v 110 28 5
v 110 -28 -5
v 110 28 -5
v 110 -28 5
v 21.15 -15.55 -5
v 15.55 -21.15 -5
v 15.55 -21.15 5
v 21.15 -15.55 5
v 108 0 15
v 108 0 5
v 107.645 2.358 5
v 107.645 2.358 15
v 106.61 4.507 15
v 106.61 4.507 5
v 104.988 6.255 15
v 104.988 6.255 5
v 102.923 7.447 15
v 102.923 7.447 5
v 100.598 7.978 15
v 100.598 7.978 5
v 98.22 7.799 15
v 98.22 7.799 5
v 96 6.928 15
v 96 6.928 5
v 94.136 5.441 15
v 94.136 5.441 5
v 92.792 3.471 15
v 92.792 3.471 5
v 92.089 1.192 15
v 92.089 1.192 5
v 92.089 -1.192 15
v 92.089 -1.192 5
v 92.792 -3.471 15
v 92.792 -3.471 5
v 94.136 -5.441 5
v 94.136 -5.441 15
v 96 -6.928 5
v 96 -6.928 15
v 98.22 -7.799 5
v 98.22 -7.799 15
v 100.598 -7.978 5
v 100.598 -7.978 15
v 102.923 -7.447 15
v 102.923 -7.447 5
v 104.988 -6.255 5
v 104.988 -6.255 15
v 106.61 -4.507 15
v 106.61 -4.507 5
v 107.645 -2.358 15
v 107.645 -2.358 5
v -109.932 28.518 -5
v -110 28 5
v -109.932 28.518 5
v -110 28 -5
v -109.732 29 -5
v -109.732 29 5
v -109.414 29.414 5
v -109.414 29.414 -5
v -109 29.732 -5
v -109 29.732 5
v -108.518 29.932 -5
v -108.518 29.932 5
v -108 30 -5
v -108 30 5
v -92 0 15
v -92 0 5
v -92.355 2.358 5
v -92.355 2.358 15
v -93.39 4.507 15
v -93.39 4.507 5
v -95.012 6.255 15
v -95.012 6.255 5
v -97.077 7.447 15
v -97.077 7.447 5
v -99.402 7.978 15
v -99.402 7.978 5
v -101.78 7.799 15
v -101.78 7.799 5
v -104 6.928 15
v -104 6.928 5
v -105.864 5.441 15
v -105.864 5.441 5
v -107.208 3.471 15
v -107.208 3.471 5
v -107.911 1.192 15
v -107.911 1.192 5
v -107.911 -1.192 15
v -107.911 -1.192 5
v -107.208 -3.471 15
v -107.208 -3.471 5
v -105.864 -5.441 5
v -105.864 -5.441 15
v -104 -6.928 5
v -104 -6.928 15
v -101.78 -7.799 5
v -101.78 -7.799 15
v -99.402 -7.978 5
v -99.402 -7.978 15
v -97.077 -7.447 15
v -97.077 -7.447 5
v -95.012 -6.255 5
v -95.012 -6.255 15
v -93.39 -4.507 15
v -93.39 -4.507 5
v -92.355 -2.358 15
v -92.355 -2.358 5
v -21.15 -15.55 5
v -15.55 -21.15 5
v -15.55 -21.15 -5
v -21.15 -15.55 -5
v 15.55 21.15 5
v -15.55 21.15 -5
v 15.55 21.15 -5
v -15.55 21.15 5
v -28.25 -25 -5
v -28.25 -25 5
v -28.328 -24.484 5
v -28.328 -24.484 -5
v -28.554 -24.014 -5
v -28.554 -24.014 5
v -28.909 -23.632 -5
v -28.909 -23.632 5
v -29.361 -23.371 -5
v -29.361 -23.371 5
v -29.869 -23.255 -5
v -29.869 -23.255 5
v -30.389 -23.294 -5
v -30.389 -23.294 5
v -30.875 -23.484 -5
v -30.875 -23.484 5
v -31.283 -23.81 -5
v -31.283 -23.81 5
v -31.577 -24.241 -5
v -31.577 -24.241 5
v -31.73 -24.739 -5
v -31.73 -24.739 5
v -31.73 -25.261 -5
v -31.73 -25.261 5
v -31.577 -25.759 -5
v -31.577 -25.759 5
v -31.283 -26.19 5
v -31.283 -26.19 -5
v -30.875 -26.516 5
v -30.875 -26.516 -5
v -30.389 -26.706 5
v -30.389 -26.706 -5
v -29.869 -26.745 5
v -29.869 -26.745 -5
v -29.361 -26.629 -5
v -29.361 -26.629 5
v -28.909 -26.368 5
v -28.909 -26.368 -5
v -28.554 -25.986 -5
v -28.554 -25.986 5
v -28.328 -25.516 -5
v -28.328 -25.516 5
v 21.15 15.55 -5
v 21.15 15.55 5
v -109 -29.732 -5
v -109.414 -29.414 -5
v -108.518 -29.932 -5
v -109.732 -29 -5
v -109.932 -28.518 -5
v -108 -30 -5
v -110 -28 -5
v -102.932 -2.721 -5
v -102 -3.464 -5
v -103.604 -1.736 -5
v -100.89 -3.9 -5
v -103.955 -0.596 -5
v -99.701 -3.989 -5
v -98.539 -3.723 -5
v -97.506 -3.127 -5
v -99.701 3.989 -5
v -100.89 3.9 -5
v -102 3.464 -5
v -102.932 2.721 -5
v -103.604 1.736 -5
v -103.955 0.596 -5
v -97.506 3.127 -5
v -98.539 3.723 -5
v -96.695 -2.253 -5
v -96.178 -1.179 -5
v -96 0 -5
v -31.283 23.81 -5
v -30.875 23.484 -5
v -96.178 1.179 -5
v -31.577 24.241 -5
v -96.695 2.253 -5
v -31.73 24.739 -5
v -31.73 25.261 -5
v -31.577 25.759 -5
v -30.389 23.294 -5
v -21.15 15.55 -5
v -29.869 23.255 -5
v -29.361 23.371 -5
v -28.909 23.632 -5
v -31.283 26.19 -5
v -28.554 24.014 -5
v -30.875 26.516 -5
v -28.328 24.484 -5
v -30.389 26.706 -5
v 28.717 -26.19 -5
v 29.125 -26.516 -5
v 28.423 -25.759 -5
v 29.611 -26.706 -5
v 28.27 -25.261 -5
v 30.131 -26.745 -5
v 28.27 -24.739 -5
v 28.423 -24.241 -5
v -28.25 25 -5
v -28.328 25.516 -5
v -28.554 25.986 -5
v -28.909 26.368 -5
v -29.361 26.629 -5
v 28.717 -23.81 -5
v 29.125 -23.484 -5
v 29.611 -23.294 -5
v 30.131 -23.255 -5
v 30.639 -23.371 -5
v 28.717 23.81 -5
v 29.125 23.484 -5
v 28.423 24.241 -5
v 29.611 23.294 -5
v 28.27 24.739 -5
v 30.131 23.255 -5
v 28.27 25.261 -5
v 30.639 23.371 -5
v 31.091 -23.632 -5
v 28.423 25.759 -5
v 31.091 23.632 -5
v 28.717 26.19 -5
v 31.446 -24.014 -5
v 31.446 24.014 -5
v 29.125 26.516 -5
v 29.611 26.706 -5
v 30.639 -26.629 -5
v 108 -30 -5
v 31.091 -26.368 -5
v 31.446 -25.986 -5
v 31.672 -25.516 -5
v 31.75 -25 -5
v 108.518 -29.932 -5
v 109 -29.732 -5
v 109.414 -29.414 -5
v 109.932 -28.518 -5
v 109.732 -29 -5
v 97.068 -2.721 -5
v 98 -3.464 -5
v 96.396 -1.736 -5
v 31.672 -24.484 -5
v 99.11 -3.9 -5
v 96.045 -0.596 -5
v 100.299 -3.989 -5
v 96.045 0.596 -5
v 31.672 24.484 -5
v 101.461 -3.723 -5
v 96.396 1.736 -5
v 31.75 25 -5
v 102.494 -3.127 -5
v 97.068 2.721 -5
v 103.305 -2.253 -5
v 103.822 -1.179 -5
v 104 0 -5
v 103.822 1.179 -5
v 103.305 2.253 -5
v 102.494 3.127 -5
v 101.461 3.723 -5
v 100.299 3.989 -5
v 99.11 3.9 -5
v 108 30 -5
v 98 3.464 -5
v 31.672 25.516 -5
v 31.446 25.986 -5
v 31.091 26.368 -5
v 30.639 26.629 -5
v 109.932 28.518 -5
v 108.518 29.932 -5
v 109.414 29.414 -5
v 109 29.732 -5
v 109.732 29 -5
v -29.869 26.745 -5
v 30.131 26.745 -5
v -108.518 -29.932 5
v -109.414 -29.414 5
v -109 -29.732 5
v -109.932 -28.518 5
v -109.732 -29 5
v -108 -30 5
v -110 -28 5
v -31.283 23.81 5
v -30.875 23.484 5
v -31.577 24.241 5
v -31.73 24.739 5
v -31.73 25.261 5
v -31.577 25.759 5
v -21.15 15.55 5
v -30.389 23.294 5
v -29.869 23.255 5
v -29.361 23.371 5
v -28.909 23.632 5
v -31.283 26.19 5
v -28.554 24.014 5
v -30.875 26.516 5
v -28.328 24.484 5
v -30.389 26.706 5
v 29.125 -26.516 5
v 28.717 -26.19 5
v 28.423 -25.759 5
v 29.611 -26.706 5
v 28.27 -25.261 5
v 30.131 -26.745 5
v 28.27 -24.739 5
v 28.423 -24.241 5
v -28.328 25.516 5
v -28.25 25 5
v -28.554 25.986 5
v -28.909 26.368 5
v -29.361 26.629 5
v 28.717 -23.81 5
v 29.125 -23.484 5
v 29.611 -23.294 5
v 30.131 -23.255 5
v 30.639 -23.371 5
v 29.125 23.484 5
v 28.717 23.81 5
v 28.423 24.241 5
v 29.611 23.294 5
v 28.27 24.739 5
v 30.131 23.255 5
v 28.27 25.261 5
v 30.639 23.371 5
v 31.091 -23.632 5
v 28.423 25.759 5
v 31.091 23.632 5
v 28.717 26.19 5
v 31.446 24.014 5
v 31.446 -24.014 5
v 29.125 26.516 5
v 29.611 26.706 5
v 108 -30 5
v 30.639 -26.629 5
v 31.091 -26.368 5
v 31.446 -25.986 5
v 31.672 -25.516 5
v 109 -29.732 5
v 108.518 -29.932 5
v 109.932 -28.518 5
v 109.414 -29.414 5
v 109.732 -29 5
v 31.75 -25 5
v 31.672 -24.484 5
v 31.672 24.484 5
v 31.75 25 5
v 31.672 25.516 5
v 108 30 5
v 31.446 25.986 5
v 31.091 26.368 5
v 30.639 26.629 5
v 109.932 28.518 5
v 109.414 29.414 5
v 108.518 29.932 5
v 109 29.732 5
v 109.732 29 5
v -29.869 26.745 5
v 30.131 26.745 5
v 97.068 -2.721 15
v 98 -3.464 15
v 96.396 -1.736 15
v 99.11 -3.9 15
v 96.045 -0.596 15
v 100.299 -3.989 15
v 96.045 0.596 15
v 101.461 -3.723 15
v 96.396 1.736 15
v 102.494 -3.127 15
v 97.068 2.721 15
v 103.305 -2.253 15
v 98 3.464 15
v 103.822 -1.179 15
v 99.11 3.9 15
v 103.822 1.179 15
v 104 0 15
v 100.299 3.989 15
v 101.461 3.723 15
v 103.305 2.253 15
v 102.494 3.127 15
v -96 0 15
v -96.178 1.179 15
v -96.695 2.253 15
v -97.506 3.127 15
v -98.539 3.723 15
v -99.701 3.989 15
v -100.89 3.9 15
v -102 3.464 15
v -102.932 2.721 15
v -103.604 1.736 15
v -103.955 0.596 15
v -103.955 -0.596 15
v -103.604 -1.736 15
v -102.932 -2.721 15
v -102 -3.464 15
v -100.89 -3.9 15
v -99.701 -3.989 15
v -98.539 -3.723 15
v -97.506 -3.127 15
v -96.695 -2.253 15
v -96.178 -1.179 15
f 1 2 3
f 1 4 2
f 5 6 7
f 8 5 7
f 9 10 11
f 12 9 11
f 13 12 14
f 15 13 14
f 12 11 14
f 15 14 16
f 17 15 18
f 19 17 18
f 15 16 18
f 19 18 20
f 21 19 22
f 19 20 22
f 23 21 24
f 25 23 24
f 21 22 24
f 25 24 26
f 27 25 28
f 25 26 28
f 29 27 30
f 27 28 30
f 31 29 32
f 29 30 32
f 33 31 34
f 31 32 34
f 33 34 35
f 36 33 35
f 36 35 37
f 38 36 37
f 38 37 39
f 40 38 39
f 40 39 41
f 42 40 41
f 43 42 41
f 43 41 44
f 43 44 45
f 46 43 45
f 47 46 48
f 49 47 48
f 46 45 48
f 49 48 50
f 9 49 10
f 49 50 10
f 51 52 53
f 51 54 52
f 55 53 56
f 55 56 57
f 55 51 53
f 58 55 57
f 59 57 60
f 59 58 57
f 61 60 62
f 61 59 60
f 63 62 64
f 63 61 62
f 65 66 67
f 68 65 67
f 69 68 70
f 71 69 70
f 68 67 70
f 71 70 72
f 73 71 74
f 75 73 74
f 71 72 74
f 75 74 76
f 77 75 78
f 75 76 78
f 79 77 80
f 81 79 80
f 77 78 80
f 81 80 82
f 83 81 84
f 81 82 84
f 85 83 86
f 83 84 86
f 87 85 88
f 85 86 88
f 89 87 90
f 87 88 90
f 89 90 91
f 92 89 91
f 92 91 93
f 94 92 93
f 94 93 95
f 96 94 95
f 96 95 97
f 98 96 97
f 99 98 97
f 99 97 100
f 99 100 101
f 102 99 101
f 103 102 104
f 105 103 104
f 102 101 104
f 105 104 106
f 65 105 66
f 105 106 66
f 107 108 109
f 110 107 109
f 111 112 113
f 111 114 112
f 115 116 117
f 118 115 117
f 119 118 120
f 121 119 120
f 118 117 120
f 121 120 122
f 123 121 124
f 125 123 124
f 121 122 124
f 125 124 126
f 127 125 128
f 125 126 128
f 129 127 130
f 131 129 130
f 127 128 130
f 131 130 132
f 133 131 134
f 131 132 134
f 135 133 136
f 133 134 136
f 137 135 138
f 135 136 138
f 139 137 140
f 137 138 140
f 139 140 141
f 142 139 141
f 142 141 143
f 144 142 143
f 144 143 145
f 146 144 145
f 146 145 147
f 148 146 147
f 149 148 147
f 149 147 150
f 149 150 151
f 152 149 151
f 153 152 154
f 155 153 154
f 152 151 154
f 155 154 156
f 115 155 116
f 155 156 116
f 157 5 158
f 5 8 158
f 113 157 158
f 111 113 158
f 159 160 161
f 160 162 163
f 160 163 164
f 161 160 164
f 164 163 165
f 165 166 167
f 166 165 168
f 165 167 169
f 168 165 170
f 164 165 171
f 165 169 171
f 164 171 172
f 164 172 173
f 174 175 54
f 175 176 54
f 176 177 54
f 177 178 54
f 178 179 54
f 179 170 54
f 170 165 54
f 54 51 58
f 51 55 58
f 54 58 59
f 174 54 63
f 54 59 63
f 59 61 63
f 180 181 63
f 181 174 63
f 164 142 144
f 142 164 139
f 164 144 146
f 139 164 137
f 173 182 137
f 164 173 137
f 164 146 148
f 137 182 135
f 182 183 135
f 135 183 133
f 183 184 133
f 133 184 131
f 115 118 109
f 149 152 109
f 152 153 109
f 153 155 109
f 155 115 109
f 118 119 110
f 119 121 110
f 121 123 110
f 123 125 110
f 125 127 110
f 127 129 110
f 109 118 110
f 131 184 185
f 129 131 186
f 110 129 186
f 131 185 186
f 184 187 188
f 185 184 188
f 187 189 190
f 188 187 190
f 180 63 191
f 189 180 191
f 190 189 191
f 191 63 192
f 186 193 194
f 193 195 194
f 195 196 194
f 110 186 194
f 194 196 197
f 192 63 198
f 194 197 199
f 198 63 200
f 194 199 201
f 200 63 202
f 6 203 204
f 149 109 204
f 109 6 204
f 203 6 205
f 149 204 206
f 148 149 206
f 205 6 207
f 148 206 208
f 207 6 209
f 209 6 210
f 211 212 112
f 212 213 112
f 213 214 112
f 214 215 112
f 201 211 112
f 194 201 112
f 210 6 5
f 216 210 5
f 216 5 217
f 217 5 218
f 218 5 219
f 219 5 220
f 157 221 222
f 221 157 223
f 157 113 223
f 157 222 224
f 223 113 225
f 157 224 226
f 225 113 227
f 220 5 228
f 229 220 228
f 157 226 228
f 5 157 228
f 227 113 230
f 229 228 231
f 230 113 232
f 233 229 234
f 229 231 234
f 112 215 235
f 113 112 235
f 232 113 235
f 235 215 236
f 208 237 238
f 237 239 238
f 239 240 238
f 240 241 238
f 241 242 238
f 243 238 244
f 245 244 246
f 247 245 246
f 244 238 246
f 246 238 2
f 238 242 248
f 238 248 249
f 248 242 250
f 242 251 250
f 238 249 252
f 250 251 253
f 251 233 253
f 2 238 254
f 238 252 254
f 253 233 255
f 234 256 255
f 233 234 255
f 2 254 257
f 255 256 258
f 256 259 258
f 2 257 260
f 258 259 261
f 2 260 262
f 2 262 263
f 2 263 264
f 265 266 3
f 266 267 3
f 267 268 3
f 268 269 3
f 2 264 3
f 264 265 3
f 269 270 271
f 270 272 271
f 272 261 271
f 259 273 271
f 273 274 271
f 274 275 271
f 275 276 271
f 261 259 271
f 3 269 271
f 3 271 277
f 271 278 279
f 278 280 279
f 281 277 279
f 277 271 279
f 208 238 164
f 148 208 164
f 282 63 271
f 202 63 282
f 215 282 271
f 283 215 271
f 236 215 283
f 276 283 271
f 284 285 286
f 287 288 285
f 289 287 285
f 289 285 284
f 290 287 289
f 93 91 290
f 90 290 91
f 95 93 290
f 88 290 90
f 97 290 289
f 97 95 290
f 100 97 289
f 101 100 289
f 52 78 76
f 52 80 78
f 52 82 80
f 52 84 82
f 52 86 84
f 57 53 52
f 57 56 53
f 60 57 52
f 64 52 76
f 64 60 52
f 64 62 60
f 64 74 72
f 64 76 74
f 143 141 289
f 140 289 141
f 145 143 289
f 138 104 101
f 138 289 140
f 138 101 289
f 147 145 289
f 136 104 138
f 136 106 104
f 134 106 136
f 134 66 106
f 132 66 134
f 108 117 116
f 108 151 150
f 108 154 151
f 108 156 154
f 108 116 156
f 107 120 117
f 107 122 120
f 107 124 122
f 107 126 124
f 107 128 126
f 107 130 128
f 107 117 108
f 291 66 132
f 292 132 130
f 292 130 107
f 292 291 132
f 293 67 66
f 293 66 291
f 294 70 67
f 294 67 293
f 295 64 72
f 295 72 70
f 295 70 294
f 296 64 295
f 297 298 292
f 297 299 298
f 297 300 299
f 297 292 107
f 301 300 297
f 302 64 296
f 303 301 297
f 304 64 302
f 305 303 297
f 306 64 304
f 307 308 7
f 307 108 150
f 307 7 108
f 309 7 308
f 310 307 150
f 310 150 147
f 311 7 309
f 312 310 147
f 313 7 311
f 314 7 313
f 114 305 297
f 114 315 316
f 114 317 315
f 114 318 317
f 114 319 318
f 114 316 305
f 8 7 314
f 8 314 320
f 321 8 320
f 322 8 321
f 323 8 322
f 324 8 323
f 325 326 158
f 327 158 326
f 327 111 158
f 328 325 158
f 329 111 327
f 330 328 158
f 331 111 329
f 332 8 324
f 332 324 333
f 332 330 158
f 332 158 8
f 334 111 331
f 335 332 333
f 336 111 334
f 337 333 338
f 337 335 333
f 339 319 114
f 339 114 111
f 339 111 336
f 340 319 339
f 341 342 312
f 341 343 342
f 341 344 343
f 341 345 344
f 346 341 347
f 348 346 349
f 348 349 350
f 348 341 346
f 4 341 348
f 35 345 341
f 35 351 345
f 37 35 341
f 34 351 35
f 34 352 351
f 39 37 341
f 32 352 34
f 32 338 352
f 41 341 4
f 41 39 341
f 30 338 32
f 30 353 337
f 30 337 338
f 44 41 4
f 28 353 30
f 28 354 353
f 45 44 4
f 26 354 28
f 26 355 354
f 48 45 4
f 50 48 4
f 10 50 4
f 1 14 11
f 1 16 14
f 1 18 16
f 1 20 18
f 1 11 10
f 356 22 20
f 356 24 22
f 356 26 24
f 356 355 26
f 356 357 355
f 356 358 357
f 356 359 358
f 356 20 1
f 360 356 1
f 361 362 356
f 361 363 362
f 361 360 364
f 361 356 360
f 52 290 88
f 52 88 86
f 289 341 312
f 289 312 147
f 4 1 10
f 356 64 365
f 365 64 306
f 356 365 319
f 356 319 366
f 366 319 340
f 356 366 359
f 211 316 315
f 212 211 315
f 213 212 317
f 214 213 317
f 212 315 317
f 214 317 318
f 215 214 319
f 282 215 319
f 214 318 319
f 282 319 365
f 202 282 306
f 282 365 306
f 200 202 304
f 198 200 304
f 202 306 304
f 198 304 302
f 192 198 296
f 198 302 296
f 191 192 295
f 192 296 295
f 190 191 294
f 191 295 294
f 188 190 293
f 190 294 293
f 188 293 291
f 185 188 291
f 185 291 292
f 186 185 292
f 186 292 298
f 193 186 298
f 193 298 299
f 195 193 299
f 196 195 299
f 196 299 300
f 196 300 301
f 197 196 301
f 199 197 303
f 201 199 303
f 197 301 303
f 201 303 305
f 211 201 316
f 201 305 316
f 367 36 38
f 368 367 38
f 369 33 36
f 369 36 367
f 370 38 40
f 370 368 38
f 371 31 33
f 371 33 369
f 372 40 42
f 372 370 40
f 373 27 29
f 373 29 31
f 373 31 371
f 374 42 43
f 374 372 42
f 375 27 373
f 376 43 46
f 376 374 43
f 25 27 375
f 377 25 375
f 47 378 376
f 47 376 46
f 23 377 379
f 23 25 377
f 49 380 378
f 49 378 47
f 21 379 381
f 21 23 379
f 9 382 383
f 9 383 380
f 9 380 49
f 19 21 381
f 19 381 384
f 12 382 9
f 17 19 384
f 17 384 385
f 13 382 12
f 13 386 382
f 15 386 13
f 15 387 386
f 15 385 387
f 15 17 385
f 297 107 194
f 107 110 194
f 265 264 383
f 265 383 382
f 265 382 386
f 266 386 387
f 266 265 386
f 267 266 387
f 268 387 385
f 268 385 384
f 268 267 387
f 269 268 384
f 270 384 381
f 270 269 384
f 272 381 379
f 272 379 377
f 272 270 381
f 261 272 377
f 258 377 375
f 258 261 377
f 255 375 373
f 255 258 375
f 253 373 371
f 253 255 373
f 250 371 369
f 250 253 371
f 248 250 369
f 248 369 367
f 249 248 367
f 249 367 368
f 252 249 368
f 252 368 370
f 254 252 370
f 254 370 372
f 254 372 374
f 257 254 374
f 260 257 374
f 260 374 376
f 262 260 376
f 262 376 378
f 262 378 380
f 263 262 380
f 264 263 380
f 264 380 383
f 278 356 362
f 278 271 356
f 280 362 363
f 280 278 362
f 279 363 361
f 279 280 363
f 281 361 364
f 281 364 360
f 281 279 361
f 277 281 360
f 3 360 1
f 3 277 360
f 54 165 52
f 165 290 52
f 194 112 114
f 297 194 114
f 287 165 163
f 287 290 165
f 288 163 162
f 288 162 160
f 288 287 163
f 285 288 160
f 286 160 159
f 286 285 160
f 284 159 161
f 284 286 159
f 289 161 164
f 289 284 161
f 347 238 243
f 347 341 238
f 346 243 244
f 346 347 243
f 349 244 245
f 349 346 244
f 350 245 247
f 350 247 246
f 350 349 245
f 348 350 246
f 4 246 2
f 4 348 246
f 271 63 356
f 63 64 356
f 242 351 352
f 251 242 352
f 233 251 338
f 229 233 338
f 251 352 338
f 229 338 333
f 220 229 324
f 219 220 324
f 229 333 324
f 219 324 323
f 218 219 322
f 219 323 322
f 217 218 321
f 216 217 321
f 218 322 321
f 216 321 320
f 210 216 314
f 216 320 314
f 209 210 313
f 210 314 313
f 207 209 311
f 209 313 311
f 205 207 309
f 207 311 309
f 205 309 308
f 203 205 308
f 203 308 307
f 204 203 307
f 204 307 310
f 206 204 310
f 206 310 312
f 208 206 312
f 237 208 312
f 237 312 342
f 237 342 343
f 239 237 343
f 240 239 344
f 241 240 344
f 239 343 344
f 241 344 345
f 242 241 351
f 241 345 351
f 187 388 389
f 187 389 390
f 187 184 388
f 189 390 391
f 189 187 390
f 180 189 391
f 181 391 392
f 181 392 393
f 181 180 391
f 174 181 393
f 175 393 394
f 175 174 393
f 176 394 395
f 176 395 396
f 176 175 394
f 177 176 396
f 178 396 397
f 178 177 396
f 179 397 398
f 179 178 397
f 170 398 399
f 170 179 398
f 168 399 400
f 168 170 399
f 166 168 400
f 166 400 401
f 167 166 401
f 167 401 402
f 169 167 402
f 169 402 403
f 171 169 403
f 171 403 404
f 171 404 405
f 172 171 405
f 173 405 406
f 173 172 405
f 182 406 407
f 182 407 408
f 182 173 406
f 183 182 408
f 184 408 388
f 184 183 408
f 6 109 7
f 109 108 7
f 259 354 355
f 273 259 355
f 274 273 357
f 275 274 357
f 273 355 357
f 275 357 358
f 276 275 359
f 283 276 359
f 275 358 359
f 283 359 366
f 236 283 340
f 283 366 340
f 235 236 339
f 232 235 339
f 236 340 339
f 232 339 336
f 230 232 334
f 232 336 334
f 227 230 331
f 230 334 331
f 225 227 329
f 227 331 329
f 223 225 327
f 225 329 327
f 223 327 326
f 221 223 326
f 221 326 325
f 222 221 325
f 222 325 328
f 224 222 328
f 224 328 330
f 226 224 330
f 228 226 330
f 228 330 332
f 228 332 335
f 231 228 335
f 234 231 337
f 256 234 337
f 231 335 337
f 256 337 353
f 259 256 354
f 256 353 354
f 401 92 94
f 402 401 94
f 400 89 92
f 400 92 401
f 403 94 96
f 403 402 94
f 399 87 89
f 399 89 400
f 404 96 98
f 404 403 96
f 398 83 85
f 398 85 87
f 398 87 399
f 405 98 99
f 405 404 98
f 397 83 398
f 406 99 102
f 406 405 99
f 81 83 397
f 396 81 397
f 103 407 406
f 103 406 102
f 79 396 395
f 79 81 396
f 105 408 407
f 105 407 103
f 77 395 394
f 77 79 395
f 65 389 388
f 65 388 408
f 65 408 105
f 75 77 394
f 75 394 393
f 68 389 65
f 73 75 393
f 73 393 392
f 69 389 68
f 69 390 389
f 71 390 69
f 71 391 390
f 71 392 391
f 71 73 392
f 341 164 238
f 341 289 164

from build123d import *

# Parameters (mm, degrees)
ESBO_O1_W                = 220
ESBO_O1_H                = 60
ESBO_O1_R                = 4
ESBO_O1_W_2              = 42.3
ESBO_O1_H_2              = 42.3
RESSALTO_EXTRUS_O1_DEPTH = 5
CHANFRO1_SIZE            = 5.6002
ESBO_O2_R                = 8
ESBO_O2_R_2              = 4
RESSALTO_EXTRUS_O2_DEPTH = 10
ESBO_O3_R                = 1.75
CORTE_EXTRUS_O1_DEPTH    = 10
FILETE1_R                = 2


with BuildPart() as part:
    # Esboço1 → Ressalto-extrusão1 (new body, symmetric)
    with BuildSketch(Plane.XY):
        Rectangle(ESBO_O1_W, ESBO_O1_H)
        with Locations((100, 0)):
            Circle(ESBO_O1_R, mode=Mode.SUBTRACT)
        with Locations((-100, 0)):
            Circle(ESBO_O1_R, mode=Mode.SUBTRACT)
        Rectangle(ESBO_O1_W_2, ESBO_O1_H_2, mode=Mode.SUBTRACT)
    extrude(amount=RESSALTO_EXTRUS_O1_DEPTH, both=True)

    # Chanfro1
    chanfro1_edges = [part.edges().sort_by_distance(p)[0] for p in [
        (21.15, -21.15, 0),
        (21.15, 21.15, 0),
        (-21.15, 21.15, 0),
        (-21.15, -21.15, 0),
    ]]
    chamfer(chanfro1_edges, length=CHANFRO1_SIZE)

    # Esboço2 → Ressalto-extrusão2 (add)
    with BuildSketch(Plane.XY.offset(5)):
        with Locations((-100, 0)):
            Circle(ESBO_O2_R)
        with Locations((-100, 0)):
            Circle(ESBO_O2_R_2, mode=Mode.SUBTRACT)
        with Locations((100, 0)):
            Circle(ESBO_O2_R)
        with Locations((100, 0)):
            Circle(ESBO_O2_R_2, mode=Mode.SUBTRACT)
    extrude(amount=RESSALTO_EXTRUS_O2_DEPTH)

    # Esboço3 → Corte-extrusão1 (cut)
    with BuildSketch(Plane.XY.offset(5)):
        with Locations((-30, 25)):
            Circle(ESBO_O3_R)
        with Locations((-30, -25)):
            Circle(ESBO_O3_R)
        with Locations((30, 25)):
            Circle(ESBO_O3_R)
        with Locations((30, -25)):
            Circle(ESBO_O3_R)
    extrude(amount=-CORTE_EXTRUS_O1_DEPTH, mode=Mode.SUBTRACT)

    # Filete1
    filete1_edges = [part.edges().sort_by_distance(p)[0] for p in [
        (110, -30, 0),
        (-110, -30, 0),
        (-110, 30, 0),
        (110, 30, 0),
    ]]
    fillet(filete1_edges, radius=FILETE1_R)


solid = part.part
